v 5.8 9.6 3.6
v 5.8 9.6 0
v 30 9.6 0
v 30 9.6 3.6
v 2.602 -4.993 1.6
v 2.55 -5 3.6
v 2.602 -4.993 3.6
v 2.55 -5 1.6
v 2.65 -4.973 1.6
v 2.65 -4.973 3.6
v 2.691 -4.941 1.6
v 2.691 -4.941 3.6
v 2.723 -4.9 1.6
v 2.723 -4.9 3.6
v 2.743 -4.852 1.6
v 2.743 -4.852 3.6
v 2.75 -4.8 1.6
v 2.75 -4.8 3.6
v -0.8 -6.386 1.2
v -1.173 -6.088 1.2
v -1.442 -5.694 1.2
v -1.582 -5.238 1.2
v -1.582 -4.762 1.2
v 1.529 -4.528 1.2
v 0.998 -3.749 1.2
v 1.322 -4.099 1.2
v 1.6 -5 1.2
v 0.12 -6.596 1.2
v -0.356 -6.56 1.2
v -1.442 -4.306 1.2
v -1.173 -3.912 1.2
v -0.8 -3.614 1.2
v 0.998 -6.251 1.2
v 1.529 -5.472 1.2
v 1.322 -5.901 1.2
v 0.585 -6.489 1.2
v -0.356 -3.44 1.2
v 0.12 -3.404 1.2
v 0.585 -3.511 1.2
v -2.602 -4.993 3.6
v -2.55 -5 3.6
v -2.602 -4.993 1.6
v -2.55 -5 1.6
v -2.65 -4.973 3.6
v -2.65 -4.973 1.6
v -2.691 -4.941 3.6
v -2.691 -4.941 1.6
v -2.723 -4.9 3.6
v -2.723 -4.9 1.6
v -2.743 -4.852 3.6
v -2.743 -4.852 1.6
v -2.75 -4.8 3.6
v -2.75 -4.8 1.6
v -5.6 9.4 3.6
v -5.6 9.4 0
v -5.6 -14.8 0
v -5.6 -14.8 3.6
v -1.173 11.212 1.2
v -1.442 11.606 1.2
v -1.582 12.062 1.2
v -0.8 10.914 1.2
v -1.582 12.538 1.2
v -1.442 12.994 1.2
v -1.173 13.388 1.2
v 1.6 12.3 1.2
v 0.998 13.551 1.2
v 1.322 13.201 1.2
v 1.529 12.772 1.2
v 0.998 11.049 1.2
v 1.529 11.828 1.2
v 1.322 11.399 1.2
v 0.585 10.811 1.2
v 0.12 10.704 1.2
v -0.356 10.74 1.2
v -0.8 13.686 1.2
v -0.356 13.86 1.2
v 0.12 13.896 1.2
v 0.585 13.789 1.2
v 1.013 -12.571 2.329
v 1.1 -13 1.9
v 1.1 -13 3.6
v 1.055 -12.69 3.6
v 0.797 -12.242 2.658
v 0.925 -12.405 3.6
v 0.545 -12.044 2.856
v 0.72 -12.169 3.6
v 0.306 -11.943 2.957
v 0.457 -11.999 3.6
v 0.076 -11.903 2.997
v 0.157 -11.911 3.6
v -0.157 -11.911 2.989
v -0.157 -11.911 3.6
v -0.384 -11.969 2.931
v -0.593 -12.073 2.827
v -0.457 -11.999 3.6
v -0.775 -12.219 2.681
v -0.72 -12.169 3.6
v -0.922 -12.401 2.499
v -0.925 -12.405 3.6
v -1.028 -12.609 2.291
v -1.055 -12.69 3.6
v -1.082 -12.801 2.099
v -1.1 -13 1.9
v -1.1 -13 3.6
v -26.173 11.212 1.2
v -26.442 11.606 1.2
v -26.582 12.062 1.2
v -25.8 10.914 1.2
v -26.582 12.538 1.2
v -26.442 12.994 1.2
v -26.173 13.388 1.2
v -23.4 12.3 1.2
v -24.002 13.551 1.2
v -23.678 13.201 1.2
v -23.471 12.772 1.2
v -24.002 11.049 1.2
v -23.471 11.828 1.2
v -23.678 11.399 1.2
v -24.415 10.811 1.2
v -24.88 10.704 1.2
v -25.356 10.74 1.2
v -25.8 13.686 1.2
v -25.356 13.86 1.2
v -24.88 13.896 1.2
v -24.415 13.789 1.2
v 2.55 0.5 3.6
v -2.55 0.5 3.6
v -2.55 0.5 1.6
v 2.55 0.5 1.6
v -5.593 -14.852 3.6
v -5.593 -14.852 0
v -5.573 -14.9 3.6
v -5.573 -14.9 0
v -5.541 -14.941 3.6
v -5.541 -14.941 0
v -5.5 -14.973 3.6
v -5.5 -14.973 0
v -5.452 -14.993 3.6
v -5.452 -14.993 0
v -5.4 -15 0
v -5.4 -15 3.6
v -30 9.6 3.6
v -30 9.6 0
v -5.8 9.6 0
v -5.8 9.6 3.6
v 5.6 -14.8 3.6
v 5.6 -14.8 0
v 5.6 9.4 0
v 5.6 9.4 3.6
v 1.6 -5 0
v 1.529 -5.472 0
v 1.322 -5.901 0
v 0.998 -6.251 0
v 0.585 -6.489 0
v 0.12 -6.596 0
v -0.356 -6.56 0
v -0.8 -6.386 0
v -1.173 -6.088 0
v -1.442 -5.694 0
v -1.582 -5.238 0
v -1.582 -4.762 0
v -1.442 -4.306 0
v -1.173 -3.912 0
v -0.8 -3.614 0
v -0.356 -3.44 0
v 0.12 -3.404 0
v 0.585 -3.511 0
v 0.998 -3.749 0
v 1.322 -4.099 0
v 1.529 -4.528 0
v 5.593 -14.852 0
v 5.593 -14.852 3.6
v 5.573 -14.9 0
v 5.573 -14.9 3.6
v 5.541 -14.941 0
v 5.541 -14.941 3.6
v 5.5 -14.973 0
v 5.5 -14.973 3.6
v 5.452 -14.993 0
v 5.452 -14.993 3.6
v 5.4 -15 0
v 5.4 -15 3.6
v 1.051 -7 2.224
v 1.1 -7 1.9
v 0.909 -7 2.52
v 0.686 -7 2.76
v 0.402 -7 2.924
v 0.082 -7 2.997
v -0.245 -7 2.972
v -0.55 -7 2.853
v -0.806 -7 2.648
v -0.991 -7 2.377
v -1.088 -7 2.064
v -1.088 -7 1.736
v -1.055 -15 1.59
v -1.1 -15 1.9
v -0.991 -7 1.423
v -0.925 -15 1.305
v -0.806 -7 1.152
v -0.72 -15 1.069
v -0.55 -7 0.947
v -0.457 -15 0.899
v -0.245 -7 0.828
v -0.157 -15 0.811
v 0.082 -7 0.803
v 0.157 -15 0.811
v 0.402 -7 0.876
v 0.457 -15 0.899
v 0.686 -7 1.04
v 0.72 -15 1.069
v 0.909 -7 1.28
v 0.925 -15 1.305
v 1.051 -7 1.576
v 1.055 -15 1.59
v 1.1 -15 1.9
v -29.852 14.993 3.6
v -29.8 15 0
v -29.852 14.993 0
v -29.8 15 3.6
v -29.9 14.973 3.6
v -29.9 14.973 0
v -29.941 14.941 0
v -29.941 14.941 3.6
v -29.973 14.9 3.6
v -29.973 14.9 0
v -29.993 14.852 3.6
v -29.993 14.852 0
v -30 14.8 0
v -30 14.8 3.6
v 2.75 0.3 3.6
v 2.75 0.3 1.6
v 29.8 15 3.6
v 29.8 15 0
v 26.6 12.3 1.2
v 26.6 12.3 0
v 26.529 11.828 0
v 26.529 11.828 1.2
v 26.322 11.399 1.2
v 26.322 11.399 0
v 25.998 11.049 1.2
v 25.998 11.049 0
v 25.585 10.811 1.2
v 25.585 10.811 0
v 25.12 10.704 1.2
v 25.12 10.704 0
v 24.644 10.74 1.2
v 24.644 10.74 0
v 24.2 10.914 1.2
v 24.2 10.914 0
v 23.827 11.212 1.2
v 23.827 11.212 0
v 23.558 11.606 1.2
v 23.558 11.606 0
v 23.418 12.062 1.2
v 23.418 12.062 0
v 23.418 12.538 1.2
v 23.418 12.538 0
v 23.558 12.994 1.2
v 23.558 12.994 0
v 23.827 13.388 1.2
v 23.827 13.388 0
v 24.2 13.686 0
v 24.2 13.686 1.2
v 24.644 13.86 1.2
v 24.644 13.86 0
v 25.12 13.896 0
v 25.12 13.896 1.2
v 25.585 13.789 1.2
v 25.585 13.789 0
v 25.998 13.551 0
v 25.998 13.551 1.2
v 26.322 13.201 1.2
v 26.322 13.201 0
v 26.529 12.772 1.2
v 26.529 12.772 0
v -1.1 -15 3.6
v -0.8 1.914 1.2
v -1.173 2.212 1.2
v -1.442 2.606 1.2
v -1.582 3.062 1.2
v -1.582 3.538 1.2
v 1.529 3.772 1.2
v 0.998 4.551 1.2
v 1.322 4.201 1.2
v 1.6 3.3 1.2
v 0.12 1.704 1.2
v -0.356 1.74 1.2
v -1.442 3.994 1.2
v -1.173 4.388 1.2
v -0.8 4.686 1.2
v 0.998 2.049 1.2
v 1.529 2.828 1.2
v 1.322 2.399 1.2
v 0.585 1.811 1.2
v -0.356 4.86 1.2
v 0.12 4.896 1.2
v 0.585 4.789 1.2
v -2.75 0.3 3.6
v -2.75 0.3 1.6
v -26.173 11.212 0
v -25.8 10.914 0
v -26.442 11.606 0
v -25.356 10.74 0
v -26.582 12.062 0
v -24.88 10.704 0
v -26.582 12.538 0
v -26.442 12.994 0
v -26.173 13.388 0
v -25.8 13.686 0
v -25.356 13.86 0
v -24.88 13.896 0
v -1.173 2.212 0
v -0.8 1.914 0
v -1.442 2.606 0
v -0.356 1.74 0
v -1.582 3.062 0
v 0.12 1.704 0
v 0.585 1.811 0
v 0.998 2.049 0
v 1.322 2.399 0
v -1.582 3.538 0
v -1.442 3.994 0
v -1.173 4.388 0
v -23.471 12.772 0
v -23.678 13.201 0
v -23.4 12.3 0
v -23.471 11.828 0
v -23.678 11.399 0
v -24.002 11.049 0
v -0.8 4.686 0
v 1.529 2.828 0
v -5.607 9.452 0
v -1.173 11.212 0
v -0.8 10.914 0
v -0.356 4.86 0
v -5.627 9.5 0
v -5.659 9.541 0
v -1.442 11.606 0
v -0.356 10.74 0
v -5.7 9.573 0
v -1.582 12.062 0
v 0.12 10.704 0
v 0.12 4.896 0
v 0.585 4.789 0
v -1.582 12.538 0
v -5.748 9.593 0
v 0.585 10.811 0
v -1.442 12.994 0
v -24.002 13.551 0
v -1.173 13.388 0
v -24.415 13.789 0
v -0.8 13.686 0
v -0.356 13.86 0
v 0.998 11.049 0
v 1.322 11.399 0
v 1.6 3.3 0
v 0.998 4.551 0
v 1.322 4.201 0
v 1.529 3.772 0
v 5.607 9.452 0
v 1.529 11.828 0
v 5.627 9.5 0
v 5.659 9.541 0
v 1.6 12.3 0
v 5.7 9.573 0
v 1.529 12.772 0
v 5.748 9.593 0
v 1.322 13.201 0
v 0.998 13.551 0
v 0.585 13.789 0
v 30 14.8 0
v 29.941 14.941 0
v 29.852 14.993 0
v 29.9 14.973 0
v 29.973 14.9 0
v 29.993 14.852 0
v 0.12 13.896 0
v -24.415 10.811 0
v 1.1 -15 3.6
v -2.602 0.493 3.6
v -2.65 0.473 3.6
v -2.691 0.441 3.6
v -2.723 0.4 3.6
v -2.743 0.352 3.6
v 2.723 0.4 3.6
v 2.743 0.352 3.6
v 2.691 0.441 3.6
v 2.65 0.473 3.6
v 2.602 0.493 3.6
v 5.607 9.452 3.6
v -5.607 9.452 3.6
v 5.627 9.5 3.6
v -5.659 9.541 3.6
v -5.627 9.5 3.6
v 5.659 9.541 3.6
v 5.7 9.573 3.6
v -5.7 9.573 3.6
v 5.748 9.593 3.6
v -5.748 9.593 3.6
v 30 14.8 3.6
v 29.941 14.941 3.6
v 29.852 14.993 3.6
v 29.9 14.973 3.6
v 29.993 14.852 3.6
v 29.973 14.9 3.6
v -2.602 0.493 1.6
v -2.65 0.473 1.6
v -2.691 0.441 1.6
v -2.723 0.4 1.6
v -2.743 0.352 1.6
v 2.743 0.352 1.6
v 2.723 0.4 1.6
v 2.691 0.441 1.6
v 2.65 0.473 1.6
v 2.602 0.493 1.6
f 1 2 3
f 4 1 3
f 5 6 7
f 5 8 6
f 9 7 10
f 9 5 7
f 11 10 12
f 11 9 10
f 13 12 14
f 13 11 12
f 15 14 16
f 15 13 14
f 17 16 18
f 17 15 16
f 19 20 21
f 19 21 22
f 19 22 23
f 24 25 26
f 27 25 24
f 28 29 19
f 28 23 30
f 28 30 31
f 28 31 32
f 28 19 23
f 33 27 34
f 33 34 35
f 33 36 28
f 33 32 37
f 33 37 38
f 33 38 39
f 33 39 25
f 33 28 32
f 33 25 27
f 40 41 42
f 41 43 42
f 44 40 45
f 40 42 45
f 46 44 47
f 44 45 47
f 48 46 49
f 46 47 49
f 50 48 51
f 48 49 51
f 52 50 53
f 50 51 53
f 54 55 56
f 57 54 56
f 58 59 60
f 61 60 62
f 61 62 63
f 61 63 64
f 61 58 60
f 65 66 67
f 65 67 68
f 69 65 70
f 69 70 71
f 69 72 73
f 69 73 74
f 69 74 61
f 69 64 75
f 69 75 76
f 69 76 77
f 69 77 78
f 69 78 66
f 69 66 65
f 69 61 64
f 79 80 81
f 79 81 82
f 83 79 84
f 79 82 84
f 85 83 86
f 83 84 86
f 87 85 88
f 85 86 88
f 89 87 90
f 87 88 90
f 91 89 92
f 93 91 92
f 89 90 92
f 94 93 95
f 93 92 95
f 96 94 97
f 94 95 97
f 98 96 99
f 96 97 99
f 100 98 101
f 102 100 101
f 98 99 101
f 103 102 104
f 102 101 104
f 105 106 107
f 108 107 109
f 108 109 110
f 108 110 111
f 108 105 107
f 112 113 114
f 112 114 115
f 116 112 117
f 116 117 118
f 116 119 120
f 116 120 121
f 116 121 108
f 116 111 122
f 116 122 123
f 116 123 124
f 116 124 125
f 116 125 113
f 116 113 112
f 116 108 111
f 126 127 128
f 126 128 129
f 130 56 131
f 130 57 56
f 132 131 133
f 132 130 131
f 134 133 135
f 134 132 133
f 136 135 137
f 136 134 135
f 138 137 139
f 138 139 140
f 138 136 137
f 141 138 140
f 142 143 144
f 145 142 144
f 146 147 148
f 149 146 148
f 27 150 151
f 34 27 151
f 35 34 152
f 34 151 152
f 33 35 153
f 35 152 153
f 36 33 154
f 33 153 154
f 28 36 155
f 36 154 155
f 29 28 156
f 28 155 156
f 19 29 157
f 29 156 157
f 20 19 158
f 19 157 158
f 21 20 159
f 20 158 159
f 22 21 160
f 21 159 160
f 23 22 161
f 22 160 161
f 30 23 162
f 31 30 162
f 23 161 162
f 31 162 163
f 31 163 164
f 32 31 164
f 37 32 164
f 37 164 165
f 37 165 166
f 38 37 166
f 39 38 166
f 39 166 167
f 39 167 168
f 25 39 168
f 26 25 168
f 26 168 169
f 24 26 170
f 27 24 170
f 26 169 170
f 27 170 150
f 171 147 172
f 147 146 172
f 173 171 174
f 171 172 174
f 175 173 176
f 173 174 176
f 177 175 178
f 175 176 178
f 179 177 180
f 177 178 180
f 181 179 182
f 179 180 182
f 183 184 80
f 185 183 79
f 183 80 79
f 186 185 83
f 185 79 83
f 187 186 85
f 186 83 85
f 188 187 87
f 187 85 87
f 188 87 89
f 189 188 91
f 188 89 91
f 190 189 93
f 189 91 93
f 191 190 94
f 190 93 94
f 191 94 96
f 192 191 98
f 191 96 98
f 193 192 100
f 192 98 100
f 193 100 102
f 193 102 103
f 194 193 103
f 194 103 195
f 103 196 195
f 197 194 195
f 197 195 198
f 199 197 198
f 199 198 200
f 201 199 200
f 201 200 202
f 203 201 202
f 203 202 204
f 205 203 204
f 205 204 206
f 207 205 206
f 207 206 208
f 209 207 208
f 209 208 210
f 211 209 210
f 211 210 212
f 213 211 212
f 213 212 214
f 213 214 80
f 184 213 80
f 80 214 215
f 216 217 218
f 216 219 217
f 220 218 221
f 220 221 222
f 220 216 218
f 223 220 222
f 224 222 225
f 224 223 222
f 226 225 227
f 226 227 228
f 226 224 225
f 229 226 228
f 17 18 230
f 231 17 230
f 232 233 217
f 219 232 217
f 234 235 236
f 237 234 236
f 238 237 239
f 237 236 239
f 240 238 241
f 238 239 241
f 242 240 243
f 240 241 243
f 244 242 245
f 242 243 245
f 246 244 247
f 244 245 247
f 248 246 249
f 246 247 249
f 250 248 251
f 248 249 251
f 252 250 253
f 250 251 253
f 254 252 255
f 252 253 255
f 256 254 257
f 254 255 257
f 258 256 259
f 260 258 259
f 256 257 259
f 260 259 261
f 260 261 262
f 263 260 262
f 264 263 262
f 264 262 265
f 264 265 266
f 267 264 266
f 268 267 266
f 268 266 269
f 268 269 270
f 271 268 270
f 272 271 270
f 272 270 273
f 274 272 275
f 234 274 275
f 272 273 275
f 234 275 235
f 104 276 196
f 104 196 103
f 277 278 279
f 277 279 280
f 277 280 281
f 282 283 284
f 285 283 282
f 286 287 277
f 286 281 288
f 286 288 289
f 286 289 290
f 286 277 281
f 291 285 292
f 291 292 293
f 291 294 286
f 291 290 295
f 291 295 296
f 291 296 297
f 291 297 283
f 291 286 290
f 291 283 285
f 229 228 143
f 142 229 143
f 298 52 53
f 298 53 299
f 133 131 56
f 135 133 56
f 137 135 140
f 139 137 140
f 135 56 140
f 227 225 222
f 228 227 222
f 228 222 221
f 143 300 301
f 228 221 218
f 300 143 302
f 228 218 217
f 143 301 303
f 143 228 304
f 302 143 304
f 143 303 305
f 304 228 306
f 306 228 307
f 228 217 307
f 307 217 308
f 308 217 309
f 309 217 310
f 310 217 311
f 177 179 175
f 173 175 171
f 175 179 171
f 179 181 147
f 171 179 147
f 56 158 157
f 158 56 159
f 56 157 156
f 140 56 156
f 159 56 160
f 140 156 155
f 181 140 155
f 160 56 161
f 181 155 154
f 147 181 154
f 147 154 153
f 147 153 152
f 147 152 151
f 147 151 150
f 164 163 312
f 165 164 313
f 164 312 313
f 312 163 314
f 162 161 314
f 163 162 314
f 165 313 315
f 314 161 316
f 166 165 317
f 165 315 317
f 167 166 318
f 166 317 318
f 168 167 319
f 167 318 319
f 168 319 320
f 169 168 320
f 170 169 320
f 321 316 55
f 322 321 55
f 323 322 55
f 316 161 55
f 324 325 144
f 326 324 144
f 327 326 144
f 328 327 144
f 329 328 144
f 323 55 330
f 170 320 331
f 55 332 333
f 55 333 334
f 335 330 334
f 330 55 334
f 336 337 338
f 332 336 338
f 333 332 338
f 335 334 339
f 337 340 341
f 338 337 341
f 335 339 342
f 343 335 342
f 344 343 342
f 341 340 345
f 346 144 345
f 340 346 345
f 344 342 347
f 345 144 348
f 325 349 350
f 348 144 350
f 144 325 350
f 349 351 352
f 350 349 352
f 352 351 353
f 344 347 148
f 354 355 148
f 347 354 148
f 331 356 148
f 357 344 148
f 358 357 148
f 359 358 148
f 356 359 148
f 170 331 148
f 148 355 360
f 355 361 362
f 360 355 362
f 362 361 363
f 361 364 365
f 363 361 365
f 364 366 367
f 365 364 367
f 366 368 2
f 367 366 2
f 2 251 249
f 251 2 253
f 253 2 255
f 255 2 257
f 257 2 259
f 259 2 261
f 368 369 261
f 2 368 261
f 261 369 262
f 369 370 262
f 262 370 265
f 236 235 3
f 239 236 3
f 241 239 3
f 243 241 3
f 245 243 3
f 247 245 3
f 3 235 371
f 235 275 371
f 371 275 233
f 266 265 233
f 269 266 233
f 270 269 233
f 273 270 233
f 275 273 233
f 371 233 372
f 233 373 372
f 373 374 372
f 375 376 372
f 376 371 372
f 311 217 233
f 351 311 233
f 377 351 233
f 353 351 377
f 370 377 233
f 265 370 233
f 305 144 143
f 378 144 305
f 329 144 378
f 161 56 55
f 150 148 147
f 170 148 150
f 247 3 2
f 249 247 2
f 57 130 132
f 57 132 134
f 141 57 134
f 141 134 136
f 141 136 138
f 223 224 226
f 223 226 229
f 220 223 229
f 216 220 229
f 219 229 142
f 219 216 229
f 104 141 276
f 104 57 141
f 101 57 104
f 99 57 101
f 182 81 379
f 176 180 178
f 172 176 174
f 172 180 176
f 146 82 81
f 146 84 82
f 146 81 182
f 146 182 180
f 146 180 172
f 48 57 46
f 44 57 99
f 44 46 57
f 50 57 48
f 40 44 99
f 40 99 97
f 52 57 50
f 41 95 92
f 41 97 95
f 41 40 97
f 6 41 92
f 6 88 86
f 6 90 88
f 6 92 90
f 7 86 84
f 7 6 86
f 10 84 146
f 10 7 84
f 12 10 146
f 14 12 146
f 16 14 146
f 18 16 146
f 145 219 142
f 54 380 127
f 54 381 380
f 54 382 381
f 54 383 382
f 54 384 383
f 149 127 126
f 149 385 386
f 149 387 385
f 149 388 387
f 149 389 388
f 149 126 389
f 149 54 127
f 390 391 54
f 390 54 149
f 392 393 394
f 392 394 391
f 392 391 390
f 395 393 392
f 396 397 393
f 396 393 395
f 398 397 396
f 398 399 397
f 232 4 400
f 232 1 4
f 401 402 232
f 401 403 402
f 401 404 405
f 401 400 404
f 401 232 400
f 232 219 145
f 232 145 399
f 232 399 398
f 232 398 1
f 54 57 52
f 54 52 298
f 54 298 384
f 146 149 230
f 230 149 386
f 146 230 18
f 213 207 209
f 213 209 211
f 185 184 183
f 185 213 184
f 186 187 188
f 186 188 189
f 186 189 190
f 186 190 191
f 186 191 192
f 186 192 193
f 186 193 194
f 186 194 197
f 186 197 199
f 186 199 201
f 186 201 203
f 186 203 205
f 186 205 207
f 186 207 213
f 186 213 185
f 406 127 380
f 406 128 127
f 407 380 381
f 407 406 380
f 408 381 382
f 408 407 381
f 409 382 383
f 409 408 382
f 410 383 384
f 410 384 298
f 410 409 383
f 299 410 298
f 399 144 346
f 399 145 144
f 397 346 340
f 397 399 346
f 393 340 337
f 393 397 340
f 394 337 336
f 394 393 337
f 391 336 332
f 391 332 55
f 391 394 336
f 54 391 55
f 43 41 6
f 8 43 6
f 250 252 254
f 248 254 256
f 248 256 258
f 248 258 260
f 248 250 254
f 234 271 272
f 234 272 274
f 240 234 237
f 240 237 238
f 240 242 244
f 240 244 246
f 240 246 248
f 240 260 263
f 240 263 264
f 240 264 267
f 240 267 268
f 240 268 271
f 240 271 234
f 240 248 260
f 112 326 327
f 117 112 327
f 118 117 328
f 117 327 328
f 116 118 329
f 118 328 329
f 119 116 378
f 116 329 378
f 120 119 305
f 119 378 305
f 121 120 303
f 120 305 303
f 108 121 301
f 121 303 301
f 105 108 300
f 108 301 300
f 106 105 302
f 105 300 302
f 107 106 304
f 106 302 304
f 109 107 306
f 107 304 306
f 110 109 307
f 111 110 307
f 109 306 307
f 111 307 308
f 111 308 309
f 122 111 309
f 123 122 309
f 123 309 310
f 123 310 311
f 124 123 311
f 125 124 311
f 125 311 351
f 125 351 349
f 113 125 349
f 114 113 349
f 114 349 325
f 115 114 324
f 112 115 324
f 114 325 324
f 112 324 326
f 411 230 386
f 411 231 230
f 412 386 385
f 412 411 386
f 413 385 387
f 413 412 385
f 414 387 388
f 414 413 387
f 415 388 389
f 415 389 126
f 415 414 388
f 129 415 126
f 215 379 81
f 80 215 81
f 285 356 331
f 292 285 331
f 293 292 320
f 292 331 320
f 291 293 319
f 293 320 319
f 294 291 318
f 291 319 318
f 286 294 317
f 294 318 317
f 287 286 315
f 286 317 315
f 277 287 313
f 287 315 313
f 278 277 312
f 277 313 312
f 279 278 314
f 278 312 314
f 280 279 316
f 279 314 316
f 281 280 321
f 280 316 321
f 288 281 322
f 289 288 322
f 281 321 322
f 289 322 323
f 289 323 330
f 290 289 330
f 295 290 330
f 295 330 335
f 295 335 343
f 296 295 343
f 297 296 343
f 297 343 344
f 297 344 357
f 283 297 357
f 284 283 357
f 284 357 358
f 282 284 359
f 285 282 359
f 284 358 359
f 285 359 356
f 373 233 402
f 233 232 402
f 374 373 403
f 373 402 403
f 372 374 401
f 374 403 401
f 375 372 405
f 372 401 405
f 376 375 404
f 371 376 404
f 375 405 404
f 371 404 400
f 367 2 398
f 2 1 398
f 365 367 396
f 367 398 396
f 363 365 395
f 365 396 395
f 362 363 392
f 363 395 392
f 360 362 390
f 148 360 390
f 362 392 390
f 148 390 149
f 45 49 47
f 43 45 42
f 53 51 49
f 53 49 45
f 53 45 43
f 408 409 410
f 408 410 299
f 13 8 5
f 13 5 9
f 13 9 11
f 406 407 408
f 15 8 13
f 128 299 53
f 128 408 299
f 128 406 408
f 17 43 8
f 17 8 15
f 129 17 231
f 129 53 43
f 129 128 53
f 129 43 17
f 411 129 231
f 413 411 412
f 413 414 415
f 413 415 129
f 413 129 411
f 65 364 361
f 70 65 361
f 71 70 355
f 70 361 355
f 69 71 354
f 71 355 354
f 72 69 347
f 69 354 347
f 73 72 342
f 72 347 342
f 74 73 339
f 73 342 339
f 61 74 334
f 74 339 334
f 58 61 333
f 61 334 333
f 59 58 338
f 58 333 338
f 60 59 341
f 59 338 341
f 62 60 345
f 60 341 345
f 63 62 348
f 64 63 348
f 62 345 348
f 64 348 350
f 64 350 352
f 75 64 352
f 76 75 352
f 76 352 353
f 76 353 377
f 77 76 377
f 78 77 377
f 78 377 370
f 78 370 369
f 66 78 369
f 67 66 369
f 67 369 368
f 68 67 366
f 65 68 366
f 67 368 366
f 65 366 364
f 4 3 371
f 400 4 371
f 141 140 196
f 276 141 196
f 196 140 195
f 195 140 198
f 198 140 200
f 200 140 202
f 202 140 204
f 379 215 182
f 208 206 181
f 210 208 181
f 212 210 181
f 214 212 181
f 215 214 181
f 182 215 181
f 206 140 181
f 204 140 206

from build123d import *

# Parameters (mm, degrees)
F1_DEPTH = 3.6
F2_R     = 1.1
F3_DEPTH = 8
F4_W     = 2.2
F4_H     = 2
F5_DEPTH = 1.7
F6_R     = 1.6
F7_DEPTH = 1.2
F8_W     = 5.5
F8_H     = 5.5
F9_DEPTH = 2
F10_R    = 0.2


# Not quite as in the source:
# - a feature names something its author has since deleted; it is built from what else it names


with BuildPart() as f1:
    # F0 (on Top) → F1 (new body)
    with BuildSketch(Plane.XY):
        Polygon((30, 15), (-30, 15), (-30, 9.6), (-5.6, 9.6), (-5.6, -15), (5.6, -15), (5.6, 9.6), (30, 9.6), align=None)
    extrude(amount=F1_DEPTH)

    # F2 (on face) → F3 (cut)
    with BuildSketch(Plane.XZ.offset(15)):
        with Locations((0, 1.9)):
            Circle(F2_R)
    extrude(amount=-F3_DEPTH, mode=Mode.SUBTRACT)

    # F4 (on face) → F5 (cut)
    with BuildSketch(Plane.XY.offset(3.6)):
        with Locations((0, -14)):
            Rectangle(F4_W, F4_H)
        with BuildLine():
            ThreePointArc((1.1, -13), (0, -11.9), (-1.1, -13))
            Line((-1.1, -13), (1.1, -13))
        make_face()
    extrude(amount=-F5_DEPTH, mode=Mode.SUBTRACT)

    # F6 (on face) → F7 (cut)
    with BuildSketch(Plane(origin=(0, 0, 0), x_dir=(1, 0, 0), z_dir=(0, 0, -1))):
        with Locations((0, 5)):
            Circle(F6_R)
        with Locations((0, -3.3)):
            Circle(F6_R)
        with Locations((25, -12.3)):
            Circle(F6_R)
        with Locations((-25, -12.3)):
            Circle(F6_R)
        with Locations((0, -12.3)):
            Circle(F6_R)
    extrude(amount=-F7_DEPTH, mode=Mode.SUBTRACT)

    # F8 (on face) → F9 (cut)
    with BuildSketch(Plane.XY.offset(3.6)):
        with Locations((0, -2.25)):
            Rectangle(F8_W, F8_H)
    extrude(amount=-F9_DEPTH, mode=Mode.SUBTRACT)

    # F10
    f10_edges = [f1.edges().sort_by_distance(p)[0] for p in [
        (-5.6, 9.6, 1.8),
        (5.6, 9.6, 1.8),
        (30, 15, 1.8),
        (-30, 15, 1.8),
        (-2.75, 0.5, 2.6),
        (2.75, 0.5, 2.6),
        (2.75, -5, 2.6),
        (-2.75, -5, 2.6),
        (5.6, -15, 1.8),
        (-5.6, -15, 1.8),
    ]]
    fillet(f10_edges, radius=F10_R)


solid = f1.part
